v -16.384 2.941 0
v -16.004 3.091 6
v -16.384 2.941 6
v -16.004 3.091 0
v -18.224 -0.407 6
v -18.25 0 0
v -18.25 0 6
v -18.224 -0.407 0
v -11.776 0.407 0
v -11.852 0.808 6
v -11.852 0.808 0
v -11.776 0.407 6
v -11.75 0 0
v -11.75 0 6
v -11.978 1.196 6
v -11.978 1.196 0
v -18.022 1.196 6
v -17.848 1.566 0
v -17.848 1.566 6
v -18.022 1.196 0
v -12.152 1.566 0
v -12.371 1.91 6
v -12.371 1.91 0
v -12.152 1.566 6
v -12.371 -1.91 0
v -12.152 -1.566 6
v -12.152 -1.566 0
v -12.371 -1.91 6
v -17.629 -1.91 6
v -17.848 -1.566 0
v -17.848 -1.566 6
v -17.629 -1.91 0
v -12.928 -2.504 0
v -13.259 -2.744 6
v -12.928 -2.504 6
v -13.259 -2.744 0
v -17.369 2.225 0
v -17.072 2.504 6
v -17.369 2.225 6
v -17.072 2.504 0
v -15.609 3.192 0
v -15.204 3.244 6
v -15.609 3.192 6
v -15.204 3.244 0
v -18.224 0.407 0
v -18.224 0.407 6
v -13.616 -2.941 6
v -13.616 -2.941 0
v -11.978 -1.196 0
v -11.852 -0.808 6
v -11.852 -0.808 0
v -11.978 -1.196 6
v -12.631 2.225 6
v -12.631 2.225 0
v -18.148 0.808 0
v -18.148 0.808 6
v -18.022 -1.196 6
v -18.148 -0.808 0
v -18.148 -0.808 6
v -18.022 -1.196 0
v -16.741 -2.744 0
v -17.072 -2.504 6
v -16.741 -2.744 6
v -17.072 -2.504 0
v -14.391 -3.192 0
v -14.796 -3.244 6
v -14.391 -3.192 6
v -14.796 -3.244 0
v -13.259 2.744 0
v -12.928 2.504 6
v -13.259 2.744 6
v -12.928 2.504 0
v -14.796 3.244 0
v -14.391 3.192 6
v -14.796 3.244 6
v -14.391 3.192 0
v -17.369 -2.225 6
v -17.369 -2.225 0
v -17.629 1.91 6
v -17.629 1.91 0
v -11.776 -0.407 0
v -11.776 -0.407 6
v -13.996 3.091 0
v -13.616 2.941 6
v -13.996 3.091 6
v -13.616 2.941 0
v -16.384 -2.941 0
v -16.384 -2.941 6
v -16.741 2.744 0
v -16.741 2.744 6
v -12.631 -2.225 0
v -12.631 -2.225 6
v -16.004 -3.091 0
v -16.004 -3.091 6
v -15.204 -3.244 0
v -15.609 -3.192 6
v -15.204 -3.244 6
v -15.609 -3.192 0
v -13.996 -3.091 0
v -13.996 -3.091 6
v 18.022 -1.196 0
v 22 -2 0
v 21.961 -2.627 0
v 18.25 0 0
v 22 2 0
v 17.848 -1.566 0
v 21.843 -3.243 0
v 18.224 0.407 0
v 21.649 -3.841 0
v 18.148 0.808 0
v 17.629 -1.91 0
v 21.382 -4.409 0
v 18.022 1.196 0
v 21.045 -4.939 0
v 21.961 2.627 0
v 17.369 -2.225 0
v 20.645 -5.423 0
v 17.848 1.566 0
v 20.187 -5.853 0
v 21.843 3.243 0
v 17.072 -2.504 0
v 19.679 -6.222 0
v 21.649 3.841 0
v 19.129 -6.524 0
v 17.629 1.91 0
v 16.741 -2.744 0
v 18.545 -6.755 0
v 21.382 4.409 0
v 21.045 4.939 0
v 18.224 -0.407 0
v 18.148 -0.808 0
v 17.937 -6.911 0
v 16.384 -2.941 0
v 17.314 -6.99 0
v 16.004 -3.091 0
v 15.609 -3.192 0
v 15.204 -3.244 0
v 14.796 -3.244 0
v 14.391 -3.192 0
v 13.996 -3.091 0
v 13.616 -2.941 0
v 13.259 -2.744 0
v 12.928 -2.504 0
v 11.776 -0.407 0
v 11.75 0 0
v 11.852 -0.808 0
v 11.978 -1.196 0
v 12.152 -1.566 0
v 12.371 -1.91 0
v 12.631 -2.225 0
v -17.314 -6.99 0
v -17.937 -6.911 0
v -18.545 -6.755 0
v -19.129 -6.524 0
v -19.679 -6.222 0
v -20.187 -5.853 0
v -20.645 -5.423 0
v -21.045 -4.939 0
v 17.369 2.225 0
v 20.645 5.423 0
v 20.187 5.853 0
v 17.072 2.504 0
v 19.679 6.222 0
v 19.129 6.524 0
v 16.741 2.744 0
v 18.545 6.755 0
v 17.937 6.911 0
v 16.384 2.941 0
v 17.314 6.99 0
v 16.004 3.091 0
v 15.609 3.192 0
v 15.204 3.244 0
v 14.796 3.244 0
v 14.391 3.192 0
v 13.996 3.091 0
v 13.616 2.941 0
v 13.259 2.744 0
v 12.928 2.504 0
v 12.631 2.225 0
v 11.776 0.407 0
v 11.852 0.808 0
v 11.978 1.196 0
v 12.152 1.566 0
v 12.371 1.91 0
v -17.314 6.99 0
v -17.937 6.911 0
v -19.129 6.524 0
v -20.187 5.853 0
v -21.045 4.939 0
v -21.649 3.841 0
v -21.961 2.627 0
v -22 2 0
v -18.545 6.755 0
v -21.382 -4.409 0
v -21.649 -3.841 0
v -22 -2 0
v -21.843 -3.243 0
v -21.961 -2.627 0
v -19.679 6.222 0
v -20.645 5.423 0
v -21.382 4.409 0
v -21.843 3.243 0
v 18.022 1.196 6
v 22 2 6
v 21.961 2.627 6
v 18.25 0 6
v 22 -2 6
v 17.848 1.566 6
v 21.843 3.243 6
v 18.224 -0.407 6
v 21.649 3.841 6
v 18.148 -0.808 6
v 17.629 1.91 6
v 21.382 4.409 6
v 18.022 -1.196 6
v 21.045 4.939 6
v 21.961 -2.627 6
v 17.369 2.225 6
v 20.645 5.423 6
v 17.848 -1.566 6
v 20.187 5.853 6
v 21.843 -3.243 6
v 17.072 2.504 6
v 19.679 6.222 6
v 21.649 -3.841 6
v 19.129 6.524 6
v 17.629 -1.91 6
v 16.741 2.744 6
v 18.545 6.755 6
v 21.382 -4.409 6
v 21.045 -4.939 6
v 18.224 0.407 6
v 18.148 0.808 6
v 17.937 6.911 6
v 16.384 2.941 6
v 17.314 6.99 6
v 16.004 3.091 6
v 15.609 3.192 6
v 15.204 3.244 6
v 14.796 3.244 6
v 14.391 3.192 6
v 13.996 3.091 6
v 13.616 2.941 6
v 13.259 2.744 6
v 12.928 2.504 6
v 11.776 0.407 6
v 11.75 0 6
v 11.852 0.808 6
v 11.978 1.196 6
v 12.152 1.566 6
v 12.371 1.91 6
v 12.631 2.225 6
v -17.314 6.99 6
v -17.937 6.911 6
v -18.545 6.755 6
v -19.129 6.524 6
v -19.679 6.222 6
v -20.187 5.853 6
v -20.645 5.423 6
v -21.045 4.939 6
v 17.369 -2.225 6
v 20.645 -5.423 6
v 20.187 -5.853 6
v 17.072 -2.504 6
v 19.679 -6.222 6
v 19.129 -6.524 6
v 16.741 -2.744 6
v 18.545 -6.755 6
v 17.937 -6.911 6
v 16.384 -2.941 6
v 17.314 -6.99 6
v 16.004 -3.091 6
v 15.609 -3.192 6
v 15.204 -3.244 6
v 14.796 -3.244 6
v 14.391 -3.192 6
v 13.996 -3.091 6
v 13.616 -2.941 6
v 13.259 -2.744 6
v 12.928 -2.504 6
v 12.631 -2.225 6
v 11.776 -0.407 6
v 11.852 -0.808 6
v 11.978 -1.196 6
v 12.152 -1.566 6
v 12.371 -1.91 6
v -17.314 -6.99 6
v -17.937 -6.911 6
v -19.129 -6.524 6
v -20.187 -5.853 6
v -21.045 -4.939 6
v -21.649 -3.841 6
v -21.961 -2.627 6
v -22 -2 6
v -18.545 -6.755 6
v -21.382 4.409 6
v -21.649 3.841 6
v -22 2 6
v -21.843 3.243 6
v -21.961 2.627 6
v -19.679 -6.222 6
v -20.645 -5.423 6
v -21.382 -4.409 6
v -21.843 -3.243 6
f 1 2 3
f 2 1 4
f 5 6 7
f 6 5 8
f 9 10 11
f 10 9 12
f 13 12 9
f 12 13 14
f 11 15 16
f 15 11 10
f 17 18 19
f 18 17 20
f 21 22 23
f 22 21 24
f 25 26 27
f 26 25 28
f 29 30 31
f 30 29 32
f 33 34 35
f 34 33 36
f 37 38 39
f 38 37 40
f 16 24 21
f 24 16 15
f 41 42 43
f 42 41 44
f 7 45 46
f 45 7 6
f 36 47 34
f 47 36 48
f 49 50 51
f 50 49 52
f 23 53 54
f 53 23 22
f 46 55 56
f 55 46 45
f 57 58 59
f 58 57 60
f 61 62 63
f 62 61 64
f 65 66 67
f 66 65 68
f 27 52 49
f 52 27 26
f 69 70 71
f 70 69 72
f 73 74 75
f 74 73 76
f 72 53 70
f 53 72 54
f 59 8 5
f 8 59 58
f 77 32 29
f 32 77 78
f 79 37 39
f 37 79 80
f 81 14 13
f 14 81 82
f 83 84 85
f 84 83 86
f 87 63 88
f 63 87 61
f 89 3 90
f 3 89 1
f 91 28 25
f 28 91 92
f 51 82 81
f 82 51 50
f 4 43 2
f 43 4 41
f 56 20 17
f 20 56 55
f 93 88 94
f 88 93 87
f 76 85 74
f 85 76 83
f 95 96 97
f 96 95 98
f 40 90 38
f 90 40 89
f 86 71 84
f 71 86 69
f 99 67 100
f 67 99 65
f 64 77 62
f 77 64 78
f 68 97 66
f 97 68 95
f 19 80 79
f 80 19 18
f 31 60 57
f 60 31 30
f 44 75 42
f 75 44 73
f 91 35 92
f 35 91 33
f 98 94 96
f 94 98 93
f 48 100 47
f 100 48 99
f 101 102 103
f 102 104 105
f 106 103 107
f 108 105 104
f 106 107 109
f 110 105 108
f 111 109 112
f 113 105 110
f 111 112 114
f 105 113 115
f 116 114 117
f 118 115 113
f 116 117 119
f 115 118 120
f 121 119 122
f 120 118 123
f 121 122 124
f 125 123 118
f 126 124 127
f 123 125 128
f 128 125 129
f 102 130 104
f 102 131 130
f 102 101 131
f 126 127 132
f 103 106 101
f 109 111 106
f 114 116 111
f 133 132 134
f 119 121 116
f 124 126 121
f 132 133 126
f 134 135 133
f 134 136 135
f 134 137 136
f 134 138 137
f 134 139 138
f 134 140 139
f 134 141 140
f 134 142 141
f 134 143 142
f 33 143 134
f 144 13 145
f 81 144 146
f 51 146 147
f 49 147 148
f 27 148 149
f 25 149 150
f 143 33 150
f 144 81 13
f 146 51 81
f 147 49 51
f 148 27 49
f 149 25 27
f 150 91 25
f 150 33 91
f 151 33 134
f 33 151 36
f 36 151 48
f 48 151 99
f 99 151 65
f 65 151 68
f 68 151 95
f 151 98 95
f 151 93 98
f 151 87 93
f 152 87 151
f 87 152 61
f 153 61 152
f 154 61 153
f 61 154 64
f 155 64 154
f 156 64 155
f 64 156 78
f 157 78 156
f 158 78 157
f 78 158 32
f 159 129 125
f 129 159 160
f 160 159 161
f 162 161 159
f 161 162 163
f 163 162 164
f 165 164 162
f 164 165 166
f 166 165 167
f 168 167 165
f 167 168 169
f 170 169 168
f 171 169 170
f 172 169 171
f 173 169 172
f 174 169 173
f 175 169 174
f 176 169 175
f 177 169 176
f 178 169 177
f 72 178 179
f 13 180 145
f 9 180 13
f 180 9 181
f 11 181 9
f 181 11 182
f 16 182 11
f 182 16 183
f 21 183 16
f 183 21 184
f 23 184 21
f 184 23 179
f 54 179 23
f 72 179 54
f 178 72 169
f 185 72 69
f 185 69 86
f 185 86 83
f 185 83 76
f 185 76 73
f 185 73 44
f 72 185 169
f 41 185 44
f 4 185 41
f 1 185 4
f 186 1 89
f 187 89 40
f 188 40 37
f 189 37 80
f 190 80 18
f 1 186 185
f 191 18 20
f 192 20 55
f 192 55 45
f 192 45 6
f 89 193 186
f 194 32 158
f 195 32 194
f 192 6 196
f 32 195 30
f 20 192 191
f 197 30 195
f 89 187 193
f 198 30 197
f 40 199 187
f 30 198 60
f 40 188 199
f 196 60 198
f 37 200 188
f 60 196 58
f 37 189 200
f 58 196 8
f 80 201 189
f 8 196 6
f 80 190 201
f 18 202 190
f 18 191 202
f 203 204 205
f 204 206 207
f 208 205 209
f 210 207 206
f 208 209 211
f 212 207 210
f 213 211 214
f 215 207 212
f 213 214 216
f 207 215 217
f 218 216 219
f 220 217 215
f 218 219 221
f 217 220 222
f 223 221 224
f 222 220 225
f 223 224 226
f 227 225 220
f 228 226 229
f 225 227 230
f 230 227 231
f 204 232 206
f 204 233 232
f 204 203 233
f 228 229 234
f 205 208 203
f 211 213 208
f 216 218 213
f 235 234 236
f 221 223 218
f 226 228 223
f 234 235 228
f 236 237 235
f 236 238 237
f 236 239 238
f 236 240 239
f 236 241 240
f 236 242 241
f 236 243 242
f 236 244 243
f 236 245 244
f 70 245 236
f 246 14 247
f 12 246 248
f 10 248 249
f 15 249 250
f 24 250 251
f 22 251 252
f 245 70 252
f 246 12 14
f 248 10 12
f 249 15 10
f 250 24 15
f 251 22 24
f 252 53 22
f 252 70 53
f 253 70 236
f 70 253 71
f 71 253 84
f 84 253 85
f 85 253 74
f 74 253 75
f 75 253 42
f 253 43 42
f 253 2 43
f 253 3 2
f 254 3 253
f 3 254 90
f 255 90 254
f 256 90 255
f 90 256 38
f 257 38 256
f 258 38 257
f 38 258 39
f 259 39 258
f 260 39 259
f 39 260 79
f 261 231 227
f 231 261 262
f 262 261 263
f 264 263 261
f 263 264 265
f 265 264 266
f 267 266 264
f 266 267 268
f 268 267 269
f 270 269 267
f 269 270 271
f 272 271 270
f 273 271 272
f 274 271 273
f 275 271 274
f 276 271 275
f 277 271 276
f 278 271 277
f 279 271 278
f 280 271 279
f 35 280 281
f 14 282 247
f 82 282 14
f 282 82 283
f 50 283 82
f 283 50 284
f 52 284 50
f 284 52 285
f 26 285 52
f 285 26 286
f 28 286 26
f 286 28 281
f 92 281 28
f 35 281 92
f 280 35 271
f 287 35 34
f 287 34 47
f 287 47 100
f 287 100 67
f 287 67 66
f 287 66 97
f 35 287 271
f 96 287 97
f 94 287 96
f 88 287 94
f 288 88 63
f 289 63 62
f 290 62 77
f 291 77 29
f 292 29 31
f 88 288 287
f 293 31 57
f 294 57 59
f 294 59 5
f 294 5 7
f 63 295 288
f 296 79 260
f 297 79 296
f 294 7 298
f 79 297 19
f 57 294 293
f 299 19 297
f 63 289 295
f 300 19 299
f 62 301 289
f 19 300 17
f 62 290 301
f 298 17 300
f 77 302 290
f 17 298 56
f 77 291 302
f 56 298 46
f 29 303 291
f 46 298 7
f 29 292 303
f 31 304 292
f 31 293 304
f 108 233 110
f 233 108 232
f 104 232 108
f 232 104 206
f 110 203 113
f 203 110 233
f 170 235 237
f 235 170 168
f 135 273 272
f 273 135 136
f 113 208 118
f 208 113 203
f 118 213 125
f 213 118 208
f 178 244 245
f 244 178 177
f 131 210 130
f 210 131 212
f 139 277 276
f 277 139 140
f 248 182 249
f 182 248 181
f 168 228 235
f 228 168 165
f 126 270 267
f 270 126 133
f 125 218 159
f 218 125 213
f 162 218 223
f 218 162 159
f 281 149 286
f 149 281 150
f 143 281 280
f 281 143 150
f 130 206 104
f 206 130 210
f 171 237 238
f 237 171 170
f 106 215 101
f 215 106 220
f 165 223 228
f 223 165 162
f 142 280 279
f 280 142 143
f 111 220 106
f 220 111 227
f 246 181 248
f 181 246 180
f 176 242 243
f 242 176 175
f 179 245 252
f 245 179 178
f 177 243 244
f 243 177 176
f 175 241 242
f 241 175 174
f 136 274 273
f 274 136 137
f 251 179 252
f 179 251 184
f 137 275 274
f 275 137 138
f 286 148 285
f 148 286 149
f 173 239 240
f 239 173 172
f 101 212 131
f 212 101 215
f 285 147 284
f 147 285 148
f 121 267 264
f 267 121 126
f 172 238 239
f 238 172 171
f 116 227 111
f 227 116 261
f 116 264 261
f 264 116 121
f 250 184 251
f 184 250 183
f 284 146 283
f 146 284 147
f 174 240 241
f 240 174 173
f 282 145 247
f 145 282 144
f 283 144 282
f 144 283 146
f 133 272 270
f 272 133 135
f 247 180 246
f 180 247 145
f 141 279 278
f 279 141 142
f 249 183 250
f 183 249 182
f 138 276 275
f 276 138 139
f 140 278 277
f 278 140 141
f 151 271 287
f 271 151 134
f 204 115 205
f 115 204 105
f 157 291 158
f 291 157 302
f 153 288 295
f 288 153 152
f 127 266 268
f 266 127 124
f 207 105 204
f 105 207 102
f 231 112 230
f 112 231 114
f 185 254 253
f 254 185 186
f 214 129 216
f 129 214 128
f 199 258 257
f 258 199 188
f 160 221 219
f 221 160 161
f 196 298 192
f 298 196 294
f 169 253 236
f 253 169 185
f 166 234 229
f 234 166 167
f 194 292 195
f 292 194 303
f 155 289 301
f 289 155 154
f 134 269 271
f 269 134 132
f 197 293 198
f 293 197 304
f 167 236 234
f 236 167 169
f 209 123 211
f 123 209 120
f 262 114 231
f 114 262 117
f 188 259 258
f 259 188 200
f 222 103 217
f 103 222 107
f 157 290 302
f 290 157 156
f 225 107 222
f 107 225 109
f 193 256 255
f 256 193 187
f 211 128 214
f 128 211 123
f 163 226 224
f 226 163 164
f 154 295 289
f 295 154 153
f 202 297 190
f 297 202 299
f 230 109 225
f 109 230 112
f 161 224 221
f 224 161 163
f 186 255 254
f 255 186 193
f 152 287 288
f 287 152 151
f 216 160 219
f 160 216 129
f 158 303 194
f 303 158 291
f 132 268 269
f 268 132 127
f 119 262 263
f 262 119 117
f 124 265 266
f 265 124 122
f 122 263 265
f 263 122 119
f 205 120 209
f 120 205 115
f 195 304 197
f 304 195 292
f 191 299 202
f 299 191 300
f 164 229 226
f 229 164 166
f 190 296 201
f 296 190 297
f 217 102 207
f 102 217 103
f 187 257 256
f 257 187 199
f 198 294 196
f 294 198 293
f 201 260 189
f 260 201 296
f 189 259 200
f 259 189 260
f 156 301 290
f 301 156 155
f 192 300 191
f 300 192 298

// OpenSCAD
$fn = 50;


difference() {
	union() {
		hull() {
			translate(v = [-17.0000000000, 2.0000000000, 0]) {
				cylinder(h = 6, r = 5);
			}
			translate(v = [17.0000000000, 2.0000000000, 0]) {
				cylinder(h = 6, r = 5);
			}
			translate(v = [-17.0000000000, -2.0000000000, 0]) {
				cylinder(h = 6, r = 5);
			}
			translate(v = [17.0000000000, -2.0000000000, 0]) {
				cylinder(h = 6, r = 5);
			}
		}
	}
	union() {
		translate(v = [-15.0000000000, 0.0000000000, 0]) {
			cylinder(h = 6, r = 3.2500000000);
		}
		translate(v = [15.0000000000, 0.0000000000, 0]) {
			cylinder(h = 6, r = 3.2500000000);
		}
		translate(v = [-15.0000000000, 0.0000000000, 0]) {
			cylinder(h = 6, r = 1.8000000000);
		}
		translate(v = [15.0000000000, 0.0000000000, 0]) {
			cylinder(h = 6, r = 1.8000000000);
		}
		translate(v = [-15.0000000000, 0.0000000000, 0]) {
			cylinder(h = 6, r = 1.8000000000);
		}
		translate(v = [15.0000000000, 0.0000000000, 0]) {
			cylinder(h = 6, r = 1.8000000000);
		}
		translate(v = [-15.0000000000, 0.0000000000, 0]) {
			cylinder(h = 6, r = 1.8000000000);
		}
		translate(v = [15.0000000000, 0.0000000000, 0]) {
			cylinder(h = 6, r = 1.8000000000);
		}
	}
}
